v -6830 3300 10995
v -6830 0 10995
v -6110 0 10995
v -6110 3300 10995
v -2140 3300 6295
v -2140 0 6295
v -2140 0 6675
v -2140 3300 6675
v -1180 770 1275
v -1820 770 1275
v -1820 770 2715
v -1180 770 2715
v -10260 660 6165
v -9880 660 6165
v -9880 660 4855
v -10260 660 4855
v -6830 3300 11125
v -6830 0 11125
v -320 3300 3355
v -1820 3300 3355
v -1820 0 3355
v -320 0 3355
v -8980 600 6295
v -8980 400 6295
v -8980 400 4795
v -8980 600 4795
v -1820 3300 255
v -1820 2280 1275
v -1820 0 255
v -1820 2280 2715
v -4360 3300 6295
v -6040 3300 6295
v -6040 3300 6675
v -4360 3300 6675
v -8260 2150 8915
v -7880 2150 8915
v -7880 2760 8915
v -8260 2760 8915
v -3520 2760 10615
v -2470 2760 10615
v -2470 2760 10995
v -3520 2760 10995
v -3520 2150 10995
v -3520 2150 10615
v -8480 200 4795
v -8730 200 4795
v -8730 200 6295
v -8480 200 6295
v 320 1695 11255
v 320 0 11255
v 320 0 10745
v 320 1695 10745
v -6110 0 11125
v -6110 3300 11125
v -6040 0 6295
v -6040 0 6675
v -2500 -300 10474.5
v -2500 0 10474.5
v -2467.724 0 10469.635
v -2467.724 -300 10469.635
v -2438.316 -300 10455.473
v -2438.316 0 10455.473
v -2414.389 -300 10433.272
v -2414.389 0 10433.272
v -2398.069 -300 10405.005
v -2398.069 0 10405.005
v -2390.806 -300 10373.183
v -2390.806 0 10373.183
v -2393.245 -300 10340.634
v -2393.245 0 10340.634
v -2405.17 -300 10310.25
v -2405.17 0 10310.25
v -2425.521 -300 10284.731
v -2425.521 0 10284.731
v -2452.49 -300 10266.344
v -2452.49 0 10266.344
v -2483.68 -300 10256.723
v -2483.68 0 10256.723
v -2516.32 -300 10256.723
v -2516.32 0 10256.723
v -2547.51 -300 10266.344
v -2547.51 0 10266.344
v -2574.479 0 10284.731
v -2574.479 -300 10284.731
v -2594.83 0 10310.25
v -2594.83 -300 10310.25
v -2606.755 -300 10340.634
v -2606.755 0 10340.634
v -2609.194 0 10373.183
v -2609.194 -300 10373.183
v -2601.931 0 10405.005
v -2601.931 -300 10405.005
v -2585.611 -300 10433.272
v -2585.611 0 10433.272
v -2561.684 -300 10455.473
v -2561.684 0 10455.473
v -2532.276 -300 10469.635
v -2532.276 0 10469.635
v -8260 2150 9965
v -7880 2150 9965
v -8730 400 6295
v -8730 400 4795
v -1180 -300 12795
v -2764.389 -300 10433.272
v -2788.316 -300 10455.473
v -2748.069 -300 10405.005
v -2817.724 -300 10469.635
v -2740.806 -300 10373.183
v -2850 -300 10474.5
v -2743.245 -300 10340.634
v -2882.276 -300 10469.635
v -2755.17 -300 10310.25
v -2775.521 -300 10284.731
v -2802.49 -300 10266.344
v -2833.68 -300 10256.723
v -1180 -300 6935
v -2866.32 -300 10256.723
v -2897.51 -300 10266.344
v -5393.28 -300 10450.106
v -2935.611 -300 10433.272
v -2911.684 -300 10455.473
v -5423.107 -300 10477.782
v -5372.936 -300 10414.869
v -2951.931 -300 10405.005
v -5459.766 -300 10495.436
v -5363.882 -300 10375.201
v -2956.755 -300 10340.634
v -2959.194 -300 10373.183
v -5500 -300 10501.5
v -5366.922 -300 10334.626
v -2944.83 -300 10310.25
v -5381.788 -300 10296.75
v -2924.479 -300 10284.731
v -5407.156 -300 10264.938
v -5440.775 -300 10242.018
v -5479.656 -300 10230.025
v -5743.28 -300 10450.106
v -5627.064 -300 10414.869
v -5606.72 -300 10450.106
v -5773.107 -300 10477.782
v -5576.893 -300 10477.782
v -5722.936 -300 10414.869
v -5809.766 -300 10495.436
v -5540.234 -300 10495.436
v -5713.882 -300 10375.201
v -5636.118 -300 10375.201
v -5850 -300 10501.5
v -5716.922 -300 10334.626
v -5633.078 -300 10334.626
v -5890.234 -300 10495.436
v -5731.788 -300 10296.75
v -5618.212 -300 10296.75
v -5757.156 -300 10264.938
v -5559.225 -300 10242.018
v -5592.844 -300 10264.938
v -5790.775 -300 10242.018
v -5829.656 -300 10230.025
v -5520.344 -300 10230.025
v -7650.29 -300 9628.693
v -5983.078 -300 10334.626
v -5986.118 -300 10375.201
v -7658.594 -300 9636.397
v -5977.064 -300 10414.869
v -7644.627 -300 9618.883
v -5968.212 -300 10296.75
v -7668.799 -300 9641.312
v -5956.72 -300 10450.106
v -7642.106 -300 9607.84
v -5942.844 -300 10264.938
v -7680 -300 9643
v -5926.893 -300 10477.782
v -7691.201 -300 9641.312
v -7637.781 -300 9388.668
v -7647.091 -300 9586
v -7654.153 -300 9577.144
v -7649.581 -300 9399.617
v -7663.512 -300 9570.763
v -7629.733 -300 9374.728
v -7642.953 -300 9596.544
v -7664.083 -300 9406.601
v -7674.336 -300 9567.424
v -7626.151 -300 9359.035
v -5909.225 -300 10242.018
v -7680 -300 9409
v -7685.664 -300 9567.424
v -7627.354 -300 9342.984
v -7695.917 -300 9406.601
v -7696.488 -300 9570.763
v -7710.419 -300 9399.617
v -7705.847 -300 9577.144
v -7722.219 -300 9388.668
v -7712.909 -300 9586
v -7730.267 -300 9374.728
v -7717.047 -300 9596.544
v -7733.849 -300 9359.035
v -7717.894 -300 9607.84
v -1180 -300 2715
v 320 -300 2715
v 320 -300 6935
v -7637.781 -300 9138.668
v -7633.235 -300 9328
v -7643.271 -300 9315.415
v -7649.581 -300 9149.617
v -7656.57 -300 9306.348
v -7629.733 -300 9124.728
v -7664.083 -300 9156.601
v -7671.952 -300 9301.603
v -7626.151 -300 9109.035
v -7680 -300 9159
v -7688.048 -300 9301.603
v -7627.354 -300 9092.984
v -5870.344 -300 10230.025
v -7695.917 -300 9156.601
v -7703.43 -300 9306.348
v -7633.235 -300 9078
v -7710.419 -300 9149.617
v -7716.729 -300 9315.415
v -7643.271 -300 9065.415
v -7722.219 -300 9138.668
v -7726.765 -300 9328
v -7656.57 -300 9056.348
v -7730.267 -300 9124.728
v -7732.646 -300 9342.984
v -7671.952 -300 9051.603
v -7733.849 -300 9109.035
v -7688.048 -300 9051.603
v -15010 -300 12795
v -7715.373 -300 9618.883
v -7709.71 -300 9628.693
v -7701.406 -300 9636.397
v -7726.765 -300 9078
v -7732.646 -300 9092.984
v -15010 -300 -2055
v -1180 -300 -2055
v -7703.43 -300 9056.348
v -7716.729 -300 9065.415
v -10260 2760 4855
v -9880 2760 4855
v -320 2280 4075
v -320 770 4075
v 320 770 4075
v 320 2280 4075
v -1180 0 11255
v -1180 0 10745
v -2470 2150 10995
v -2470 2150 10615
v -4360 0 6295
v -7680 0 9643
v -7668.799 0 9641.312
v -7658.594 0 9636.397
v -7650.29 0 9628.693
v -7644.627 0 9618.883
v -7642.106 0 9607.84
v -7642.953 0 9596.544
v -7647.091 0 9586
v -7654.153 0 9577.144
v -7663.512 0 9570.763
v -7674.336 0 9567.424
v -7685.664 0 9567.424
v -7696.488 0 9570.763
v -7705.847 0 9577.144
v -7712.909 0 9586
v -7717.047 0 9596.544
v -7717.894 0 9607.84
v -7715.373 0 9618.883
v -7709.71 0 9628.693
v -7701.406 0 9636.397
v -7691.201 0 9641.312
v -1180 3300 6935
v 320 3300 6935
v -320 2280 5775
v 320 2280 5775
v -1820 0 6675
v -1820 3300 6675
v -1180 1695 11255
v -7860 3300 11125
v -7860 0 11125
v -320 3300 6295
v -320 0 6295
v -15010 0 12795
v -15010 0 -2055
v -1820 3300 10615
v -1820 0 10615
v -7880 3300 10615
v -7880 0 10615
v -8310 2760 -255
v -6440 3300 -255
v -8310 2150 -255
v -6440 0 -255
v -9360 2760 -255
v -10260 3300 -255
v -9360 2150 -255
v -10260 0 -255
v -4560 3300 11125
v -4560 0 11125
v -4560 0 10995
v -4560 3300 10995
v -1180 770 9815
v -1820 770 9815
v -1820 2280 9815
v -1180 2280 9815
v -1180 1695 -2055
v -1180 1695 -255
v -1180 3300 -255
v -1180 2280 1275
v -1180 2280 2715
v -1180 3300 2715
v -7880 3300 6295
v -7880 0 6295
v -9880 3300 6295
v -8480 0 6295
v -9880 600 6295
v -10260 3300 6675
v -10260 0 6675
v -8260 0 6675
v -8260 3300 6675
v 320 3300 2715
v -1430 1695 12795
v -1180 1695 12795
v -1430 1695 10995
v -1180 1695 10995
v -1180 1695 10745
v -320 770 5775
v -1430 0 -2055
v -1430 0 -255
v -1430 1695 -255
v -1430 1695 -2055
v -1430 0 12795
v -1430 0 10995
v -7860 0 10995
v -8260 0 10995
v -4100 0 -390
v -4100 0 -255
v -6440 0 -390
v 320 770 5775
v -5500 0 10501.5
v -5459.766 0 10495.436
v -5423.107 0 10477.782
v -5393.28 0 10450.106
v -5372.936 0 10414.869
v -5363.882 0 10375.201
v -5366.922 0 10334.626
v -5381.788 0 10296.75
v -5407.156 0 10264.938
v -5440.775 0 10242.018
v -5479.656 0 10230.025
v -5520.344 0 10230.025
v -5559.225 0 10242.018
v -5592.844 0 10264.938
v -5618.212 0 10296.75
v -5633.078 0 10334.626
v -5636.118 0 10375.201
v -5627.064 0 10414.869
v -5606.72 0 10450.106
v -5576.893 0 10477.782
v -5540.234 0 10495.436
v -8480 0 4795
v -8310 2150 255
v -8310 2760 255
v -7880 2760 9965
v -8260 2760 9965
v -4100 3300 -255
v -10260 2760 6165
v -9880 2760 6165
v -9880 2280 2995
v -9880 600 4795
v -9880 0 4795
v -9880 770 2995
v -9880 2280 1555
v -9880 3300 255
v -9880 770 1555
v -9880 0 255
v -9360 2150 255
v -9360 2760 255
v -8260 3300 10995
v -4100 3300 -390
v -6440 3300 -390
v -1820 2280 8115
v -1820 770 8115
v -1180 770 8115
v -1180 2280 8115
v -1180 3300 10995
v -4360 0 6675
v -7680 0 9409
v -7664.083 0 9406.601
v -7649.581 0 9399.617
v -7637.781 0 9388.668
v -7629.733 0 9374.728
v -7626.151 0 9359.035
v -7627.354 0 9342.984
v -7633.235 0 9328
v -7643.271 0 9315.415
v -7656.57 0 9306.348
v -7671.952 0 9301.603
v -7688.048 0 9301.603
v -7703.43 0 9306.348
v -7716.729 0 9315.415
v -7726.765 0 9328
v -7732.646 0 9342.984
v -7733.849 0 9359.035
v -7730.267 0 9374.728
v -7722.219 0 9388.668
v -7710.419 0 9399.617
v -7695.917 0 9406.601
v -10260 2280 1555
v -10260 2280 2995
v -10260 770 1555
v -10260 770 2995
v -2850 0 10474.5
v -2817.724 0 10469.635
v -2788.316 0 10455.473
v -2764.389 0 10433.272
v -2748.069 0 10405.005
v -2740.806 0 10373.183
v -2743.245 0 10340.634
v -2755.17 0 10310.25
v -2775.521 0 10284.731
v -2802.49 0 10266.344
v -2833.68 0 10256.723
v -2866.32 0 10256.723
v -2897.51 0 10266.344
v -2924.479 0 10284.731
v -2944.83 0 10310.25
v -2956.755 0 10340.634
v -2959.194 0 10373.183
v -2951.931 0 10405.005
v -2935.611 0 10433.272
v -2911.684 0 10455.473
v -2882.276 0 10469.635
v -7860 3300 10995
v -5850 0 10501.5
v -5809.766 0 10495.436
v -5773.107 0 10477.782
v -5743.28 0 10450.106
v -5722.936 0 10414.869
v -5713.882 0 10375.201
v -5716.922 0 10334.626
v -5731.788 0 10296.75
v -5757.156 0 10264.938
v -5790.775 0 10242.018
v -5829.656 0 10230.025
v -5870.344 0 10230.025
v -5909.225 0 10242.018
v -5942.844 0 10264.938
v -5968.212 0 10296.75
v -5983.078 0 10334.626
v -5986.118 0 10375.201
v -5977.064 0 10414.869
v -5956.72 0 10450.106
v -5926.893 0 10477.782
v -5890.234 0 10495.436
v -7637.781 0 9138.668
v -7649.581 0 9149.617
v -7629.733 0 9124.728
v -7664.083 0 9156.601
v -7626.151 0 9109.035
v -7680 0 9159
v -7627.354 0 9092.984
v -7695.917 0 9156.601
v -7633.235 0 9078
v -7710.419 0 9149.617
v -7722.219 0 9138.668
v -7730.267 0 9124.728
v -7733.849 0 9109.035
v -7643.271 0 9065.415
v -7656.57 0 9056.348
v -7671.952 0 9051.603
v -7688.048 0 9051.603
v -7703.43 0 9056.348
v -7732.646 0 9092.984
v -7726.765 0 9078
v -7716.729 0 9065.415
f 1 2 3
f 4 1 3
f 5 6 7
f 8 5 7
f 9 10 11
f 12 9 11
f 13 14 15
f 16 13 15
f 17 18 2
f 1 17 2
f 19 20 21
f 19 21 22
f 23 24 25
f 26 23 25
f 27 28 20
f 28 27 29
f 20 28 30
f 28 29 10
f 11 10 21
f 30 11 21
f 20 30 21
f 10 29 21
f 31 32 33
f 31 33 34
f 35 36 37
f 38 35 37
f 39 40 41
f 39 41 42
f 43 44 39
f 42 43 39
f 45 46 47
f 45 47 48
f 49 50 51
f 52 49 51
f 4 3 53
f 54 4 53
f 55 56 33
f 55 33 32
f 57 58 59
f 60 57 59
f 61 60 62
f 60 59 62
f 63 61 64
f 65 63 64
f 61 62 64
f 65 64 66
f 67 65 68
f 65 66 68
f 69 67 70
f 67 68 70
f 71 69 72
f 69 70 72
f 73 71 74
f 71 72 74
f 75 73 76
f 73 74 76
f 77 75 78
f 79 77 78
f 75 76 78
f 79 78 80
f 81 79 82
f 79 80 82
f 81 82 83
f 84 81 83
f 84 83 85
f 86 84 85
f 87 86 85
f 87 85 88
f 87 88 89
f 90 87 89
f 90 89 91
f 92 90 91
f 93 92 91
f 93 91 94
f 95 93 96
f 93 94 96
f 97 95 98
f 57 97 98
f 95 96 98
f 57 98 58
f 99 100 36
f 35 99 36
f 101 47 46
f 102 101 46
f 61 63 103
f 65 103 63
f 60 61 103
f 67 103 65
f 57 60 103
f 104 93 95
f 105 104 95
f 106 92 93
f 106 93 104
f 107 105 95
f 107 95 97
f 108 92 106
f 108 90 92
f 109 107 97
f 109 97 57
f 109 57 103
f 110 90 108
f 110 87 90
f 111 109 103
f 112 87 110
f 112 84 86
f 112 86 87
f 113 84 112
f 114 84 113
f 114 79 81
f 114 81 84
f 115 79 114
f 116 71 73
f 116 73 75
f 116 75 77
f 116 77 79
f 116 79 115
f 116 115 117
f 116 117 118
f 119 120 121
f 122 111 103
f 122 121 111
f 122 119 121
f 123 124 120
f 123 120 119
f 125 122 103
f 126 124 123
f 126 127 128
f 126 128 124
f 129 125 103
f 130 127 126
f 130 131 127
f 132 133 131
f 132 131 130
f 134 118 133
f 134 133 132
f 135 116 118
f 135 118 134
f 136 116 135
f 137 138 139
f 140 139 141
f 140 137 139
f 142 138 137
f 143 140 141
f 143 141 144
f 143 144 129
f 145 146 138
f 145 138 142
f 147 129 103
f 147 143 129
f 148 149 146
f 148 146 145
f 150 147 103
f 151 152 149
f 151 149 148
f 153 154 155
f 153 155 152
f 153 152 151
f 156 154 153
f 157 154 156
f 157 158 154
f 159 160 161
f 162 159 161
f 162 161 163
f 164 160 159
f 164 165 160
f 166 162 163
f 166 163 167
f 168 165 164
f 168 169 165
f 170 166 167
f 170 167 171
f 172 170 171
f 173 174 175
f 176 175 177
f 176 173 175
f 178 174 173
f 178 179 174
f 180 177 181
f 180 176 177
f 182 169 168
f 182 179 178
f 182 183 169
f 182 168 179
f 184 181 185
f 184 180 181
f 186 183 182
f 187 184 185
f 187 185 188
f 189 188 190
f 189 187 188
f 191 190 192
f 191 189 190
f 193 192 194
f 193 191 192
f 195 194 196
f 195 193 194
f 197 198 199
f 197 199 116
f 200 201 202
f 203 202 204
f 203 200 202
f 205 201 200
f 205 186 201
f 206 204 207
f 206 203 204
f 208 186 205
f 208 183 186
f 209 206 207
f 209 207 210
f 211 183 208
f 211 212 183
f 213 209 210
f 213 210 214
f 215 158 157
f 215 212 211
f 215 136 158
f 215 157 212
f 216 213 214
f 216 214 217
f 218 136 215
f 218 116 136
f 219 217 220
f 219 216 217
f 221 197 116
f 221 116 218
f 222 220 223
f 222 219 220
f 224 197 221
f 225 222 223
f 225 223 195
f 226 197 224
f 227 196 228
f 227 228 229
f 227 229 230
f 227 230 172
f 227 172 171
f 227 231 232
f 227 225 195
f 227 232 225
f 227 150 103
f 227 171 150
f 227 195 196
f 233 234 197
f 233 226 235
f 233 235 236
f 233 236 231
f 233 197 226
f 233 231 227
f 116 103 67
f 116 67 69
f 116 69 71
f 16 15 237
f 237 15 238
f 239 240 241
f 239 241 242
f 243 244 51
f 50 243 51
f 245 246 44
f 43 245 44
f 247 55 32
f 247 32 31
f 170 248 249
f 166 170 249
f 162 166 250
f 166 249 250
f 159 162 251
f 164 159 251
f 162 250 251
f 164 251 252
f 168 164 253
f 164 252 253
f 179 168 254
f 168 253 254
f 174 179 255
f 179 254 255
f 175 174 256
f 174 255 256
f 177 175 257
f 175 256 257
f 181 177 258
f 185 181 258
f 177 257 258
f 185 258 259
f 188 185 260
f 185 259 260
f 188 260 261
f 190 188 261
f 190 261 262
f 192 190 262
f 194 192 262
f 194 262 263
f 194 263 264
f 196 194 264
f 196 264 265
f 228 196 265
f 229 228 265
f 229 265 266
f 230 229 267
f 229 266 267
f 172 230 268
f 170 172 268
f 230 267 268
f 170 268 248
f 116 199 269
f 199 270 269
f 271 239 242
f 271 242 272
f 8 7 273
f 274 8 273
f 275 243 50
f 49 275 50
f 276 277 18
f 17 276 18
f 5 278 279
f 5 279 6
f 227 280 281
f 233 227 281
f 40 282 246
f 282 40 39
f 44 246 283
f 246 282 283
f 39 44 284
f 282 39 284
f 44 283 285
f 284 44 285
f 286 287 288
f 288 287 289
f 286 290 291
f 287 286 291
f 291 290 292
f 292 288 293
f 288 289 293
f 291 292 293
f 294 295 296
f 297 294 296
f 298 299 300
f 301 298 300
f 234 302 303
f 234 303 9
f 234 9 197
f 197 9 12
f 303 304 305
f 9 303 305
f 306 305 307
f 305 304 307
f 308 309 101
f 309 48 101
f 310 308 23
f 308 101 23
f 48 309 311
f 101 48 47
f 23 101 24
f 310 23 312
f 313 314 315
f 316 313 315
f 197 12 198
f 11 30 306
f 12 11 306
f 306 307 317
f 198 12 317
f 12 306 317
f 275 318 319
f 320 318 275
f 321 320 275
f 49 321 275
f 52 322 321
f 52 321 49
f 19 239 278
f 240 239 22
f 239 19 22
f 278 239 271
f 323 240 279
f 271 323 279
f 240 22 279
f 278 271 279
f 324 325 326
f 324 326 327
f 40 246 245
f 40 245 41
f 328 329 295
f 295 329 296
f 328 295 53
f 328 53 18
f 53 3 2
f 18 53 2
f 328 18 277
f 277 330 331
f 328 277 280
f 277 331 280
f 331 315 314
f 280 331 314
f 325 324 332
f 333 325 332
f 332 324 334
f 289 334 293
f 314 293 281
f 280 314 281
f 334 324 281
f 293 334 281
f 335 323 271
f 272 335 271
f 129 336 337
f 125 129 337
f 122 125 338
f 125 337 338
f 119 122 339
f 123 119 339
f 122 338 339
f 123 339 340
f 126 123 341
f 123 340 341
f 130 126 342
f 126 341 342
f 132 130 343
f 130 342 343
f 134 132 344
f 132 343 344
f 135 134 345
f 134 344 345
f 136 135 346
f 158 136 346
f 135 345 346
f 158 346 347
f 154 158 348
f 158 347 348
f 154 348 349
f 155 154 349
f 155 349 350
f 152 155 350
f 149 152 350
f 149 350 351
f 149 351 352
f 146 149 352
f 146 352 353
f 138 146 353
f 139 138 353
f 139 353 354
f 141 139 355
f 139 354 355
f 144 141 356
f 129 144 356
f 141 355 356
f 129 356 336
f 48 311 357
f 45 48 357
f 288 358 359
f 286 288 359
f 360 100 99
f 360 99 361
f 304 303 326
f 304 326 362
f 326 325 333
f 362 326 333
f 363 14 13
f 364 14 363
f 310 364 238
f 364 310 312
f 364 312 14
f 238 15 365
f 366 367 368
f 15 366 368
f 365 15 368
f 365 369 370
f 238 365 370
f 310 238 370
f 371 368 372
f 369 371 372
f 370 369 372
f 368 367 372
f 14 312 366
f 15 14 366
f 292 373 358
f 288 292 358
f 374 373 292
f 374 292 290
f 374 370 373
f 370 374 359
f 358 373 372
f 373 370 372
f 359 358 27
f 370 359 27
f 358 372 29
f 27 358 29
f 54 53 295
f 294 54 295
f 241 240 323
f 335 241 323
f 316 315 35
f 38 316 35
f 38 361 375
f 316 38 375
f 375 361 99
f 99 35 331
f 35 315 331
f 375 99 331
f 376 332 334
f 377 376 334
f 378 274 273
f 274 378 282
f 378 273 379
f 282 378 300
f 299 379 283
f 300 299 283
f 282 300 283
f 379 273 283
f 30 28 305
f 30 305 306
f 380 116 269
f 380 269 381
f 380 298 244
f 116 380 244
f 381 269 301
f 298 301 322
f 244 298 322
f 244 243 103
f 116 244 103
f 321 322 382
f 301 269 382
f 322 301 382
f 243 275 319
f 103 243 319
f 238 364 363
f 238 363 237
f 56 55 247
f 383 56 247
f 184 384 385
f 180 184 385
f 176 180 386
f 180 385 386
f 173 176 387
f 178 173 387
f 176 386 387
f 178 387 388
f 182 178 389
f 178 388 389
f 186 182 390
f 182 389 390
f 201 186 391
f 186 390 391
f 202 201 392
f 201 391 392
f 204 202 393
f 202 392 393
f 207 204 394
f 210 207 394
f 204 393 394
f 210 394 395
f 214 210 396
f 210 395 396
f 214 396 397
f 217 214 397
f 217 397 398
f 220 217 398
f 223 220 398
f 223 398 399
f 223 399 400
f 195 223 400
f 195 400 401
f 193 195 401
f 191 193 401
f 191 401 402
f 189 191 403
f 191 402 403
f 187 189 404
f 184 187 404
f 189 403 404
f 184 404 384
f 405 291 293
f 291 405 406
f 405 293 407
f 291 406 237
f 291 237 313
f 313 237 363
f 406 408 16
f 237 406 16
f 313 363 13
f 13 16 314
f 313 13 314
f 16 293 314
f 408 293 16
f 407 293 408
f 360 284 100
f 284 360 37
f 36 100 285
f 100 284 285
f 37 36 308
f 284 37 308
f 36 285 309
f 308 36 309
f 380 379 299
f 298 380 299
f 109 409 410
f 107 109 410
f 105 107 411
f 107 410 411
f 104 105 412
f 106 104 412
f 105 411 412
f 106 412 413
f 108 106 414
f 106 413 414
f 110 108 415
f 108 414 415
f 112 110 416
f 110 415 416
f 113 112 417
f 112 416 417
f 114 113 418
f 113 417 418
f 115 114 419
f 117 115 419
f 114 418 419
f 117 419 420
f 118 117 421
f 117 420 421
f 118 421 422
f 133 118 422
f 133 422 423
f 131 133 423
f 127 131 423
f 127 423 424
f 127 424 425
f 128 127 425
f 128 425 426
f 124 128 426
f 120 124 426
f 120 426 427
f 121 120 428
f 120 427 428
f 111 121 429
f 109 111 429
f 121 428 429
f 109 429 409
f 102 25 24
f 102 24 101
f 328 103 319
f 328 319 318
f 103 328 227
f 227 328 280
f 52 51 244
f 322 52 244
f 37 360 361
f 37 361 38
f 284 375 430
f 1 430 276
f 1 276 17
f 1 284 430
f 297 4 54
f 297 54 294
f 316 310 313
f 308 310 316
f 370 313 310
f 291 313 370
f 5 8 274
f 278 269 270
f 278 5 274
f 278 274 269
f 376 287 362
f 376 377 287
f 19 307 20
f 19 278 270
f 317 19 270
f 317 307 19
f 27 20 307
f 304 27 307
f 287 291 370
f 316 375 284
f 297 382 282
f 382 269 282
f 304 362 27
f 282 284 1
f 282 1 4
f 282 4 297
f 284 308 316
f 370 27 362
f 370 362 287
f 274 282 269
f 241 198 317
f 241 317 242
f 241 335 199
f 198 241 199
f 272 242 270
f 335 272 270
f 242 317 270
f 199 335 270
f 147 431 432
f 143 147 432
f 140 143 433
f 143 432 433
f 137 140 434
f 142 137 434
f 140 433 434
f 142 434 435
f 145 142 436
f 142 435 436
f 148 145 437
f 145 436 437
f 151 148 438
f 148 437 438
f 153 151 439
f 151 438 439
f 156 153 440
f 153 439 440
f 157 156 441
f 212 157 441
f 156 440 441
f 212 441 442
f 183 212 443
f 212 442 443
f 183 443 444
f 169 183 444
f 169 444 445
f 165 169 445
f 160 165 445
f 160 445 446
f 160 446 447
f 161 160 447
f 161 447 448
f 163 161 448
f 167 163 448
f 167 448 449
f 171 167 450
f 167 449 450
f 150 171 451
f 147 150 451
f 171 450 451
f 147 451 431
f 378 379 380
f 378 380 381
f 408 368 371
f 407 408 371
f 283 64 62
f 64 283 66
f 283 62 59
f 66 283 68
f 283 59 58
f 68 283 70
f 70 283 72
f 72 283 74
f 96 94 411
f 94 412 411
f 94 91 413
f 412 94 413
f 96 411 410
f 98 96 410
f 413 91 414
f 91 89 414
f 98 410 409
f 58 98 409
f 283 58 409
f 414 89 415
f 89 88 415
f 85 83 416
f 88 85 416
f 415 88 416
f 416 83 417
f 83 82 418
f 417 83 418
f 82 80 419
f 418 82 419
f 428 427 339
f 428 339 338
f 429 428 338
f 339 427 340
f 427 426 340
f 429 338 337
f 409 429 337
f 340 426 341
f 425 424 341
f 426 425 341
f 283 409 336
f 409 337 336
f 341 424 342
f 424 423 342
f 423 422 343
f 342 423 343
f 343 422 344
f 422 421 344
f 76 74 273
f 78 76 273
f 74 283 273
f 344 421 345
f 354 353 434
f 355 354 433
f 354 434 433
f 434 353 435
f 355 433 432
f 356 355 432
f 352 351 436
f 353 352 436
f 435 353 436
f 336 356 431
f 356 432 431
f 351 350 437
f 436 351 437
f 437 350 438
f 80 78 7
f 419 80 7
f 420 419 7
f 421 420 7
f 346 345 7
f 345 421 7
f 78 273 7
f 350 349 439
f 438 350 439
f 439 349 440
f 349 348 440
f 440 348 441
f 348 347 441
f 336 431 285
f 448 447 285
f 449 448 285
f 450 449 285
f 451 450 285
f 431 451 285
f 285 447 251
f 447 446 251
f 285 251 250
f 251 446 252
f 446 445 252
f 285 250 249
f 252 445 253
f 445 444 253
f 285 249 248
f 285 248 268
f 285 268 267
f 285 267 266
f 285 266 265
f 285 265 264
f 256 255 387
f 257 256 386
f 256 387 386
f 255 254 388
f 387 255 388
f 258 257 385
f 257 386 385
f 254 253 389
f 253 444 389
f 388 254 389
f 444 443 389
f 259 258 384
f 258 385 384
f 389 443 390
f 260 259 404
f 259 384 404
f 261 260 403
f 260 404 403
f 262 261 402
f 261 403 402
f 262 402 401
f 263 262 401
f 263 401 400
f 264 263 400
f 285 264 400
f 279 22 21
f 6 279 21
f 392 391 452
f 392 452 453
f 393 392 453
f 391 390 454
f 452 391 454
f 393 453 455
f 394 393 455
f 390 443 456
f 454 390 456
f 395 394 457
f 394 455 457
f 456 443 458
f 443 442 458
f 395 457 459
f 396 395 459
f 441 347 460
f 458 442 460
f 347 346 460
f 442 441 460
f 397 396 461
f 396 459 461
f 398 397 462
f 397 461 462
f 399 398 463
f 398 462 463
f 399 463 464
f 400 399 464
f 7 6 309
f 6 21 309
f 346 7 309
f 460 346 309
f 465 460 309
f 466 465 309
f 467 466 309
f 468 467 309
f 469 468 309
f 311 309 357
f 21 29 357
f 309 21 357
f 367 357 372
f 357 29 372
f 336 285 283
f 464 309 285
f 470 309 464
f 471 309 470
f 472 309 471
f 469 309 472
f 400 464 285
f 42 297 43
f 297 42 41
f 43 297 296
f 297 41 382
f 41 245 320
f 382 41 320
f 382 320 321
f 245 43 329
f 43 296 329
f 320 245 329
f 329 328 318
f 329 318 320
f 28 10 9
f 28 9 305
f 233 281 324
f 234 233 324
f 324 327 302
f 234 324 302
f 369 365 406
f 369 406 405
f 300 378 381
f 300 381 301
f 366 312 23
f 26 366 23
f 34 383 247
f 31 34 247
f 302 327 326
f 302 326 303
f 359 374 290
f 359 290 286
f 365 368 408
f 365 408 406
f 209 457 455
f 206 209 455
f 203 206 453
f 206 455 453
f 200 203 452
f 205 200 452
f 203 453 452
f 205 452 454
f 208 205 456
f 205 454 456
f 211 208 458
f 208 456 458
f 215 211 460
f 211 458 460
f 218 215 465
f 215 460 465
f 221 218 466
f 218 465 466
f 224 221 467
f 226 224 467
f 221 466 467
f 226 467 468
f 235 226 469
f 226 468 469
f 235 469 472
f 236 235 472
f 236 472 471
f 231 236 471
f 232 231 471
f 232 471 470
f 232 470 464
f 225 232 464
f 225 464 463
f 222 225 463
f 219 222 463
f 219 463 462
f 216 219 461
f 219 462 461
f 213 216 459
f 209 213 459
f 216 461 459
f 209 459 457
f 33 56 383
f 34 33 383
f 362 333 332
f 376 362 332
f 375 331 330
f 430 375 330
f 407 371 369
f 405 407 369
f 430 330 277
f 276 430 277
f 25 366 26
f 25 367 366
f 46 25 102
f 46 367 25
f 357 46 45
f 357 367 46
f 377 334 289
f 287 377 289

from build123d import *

# Parameters (mm, degrees)
EXTRUDE_1_DEPTH     = 3300
SKETCH_1_W          = 1680
SKETCH_1_H          = 380
EXTRUDE_1_2_DEPTH   = 3300
SKETCH_3_W          = 250
SKETCH_3_H          = 1800
EXTRUDE_2_DEPTH     = 1695
EXTRUDE_3_DEPTH     = 300
SKETCH_5_W          = 1310
SKETCH_5_H          = 2100
SKETCH_5_W_2        = 1440
SKETCH_5_H_2        = 1510
CUT_EXTRUDE_1_DEPTH = 380
SKETCH_6_W          = 1400
SKETCH_6_H          = 1500
EXTRUDE_4_DEPTH     = 200
SKETCH_7_W          = 1150
SKETCH_7_H          = 1500
EXTRUDE_5_DEPTH     = 200
SKETCH_8_W          = 900
SKETCH_8_H          = 1500
EXTRUDE_6_DEPTH     = 200
SKETCH_9_W          = 1440
SKETCH_9_H          = 1510
CUT_EXTRUDE_2_DEPTH = 640
SKETCH_10_W         = 1700
SKETCH_10_H         = 1510
CUT_EXTRUDE_3_DEPTH = 640
SKETCH_11_W         = 1050
SKETCH_11_H         = 610
CUT_EXTRUDE_4_DEPTH = 510
SKETCH_12_W         = 1050
SKETCH_12_H         = 610
CUT_EXTRUDE_5_DEPTH = 380
SKETCH_13_W         = 1050
SKETCH_13_H         = 610
CUT_EXTRUDE_6_DEPTH = 380
SKETCH_14_W         = 1700
SKETCH_14_H         = 1510
CUT_EXTRUDE_7_DEPTH = 640
SKETCH_15_R         = 54
SKETCH_15_R_2       = 38
SKETCH_15_R_3       = 136.5
SKETCH_15_R_4       = 109.5
CUT_EXTRUDE_8_DEPTH = 300


with BuildPart() as part:
    # Эскиз1 → Бобышка-Вытянуть1 (new body)
    with BuildSketch(Plane(origin=(0, 0, 0), x_dir=(1, 0, 0), z_dir=(0, 1, 0))):
        Polygon((-6440, 255), (-10260, 255), (-10260, -6675), (-8260, -6675), (-8260, -10995), (-7860, -10995), (-7860, -11125), (-6830, -11125), (-6830, -10995), (-6110, -10995), (-6110, -11125), (-4560, -11125), (-4560, -10995), (-1180, -10995), (-1180, -6935), (320, -6935), (320, -2715), (-1180, -2715), (-1180, 255), (-4100, 255), (-4100, 390), (-6440, 390), align=None)
        Polygon((-7880, -10615), (-7880, -6675), (-7880, -6295), (-9880, -6295), (-9880, -255), (-1820, -255), (-1820, -3355), (-320, -3355), (-320, -6295), (-2140, -6295), (-2140, -6675), (-1820, -6675), (-1820, -10615), align=None, mode=Mode.SUBTRACT)
    extrude(amount=EXTRUDE_1_DEPTH)

    # Эскиз3 → Бобышка-Вытянуть2 (add)
    with BuildSketch(Plane(origin=(0, 0, 0), x_dir=(1, 0, 0), z_dir=(0, 1, 0))):
        with Locations((-1305, -11895)):
            Rectangle(SKETCH_3_W, SKETCH_3_H)
        Polygon((-1180, -10745), (-1180, -10995), (-1180, -11255), (320, -11255), (320, -10745), align=None)
        with Locations((-1305, 1155)):
            Rectangle(SKETCH_3_W, SKETCH_3_H)
    extrude(amount=EXTRUDE_2_DEPTH)

    # Эскиз4 → Бобышка-Вытянуть3 (add)
    with BuildSketch(Plane(origin=(0, 0, 0), x_dir=(1, 0, 0), z_dir=(0, 1, 0))):
        Polygon((-1180, 2055), (-1180, -2715), (320, -2715), (320, -6935), (-1180, -6935), (-1180, -12795), (-15010, -12795), (-15010, 2055), align=None)
    extrude(amount=-EXTRUDE_3_DEPTH)

    # Эскиз5 → Вырез-Вытянуть1 (cut)
    with BuildSketch(Plane(origin=(-9880, 0, 0), x_dir=(0, 0, -1), z_dir=(1, 0, 0))):
        with Locations((-5510, 1710)):
            Rectangle(SKETCH_5_W, SKETCH_5_H)
        with Locations((-2275, 1525)):
            Rectangle(SKETCH_5_W_2, SKETCH_5_H_2)
    extrude(amount=-CUT_EXTRUDE_1_DEPTH, mode=Mode.SUBTRACT)

    # Эскиз6 → Бобышка-Вытянуть4 (add)
    with BuildSketch(Plane(origin=(0, 0, 0), x_dir=(1, 0, 0), z_dir=(0, 1, 0))):
        with Locations((-9180, -5545)):
            Rectangle(SKETCH_6_W, SKETCH_6_H)
    extrude(amount=EXTRUDE_4_DEPTH)

    # Эскиз7 → Бобышка-Вытянуть5 (add)
    with BuildSketch(Plane(origin=(0, 200, 0), x_dir=(1, 0, 0), z_dir=(0, 1, 0))):
        with Locations((-9305, -5545)):
            Rectangle(SKETCH_7_W, SKETCH_7_H)
    extrude(amount=EXTRUDE_5_DEPTH)

    # Эскиз8 → Бобышка-Вытянуть6 (add)
    with BuildSketch(Plane(origin=(0, 400, 0), x_dir=(1, 0, 0), z_dir=(0, 1, 0))):
        with Locations((-9430, -5545)):
            Rectangle(SKETCH_8_W, SKETCH_8_H)
    extrude(amount=EXTRUDE_6_DEPTH)

    # Эскиз9 → Вырез-Вытянуть2 (cut)
    with BuildSketch(Plane.ZY.offset(1820)):
        with Locations((1995, 1525)):
            Rectangle(SKETCH_9_W, SKETCH_9_H)
    extrude(amount=-CUT_EXTRUDE_2_DEPTH, mode=Mode.SUBTRACT)

    # Эскиз10 → Вырез-Вытянуть3 (cut)
    with BuildSketch(Plane.ZY.offset(1820)):
        with Locations((8965, 1525)):
            Rectangle(SKETCH_10_W, SKETCH_10_H)
    extrude(amount=-CUT_EXTRUDE_3_DEPTH, mode=Mode.SUBTRACT)

    # Эскиз11 → Вырез-Вытянуть4 (cut)
    with BuildSketch(Plane.XY.offset(255)):
        with Locations((-8835, 2455)):
            Rectangle(SKETCH_11_W, SKETCH_11_H)
    extrude(amount=-CUT_EXTRUDE_4_DEPTH, mode=Mode.SUBTRACT)

    # Эскиз12 → Вырез-Вытянуть5 (cut)
    with BuildSketch(Plane(origin=(-7880, 0, 0), x_dir=(0, 0, -1), z_dir=(1, 0, 0))):
        with Locations((-9440, 2455)):
            Rectangle(SKETCH_12_W, SKETCH_12_H)
    extrude(amount=-CUT_EXTRUDE_5_DEPTH, mode=Mode.SUBTRACT)

    # Эскиз13 → Вырез-Вытянуть6 (cut)
    with BuildSketch(Plane(origin=(0, 0, 10615), x_dir=(-1, 0, 0), z_dir=(0, 0, -1))):
        with Locations((2995, 2455)):
            Rectangle(SKETCH_13_W, SKETCH_13_H)
    extrude(amount=-CUT_EXTRUDE_6_DEPTH, mode=Mode.SUBTRACT)

    # Эскиз14 → Вырез-Вытянуть7 (cut)
    with BuildSketch(Plane.ZY.offset(320)):
        with Locations((4925, 1525)):
            Rectangle(SKETCH_14_W, SKETCH_14_H)
    extrude(amount=-CUT_EXTRUDE_7_DEPTH, mode=Mode.SUBTRACT)

    # Эскиз15 → Вырез-Вытянуть8 (cut)
    with BuildSketch(Plane(origin=(0, 0, 0), x_dir=(1, 0, 0), z_dir=(0, 1, 0))):
        with Locations(Location((-7680, -9355, 0), (0, 0, 270))):
            Circle(SKETCH_15_R)
        with Locations(Location((-7680, -9605, 0), (0, 0, 270))):
            Circle(SKETCH_15_R_2)
        with Locations(Location((-5850, -10365, 0), (0, 0, 270))):
            Circle(SKETCH_15_R_3)
        with Locations(Location((-5500, -10365, 0), (0, 0, 270))):
            Circle(SKETCH_15_R_3)
        with Locations(Location((-2850, -10365, 0), (0, 0, 270))):
            Circle(SKETCH_15_R_4)
        with Locations(Location((-2500, -10365, 0), (0, 0, 270))):
            Circle(SKETCH_15_R_4)
        with Locations(Location((-7680, -9105, 0), (0, 0, 270))):
            Circle(SKETCH_15_R)
    extrude(amount=-CUT_EXTRUDE_8_DEPTH, mode=Mode.SUBTRACT)


with BuildPart() as body_2:
    # Эскиз1 → Extrude 1 2 (new body)
    with BuildSketch(Plane(origin=(0, 0, 0), x_dir=(1, 0, 0), z_dir=(0, 1, 0))):
        with Locations((-5200, -6485)):
            Rectangle(SKETCH_1_W, SKETCH_1_H)
    extrude(amount=EXTRUDE_1_2_DEPTH)


solid = Compound([part.part, body_2.part])
